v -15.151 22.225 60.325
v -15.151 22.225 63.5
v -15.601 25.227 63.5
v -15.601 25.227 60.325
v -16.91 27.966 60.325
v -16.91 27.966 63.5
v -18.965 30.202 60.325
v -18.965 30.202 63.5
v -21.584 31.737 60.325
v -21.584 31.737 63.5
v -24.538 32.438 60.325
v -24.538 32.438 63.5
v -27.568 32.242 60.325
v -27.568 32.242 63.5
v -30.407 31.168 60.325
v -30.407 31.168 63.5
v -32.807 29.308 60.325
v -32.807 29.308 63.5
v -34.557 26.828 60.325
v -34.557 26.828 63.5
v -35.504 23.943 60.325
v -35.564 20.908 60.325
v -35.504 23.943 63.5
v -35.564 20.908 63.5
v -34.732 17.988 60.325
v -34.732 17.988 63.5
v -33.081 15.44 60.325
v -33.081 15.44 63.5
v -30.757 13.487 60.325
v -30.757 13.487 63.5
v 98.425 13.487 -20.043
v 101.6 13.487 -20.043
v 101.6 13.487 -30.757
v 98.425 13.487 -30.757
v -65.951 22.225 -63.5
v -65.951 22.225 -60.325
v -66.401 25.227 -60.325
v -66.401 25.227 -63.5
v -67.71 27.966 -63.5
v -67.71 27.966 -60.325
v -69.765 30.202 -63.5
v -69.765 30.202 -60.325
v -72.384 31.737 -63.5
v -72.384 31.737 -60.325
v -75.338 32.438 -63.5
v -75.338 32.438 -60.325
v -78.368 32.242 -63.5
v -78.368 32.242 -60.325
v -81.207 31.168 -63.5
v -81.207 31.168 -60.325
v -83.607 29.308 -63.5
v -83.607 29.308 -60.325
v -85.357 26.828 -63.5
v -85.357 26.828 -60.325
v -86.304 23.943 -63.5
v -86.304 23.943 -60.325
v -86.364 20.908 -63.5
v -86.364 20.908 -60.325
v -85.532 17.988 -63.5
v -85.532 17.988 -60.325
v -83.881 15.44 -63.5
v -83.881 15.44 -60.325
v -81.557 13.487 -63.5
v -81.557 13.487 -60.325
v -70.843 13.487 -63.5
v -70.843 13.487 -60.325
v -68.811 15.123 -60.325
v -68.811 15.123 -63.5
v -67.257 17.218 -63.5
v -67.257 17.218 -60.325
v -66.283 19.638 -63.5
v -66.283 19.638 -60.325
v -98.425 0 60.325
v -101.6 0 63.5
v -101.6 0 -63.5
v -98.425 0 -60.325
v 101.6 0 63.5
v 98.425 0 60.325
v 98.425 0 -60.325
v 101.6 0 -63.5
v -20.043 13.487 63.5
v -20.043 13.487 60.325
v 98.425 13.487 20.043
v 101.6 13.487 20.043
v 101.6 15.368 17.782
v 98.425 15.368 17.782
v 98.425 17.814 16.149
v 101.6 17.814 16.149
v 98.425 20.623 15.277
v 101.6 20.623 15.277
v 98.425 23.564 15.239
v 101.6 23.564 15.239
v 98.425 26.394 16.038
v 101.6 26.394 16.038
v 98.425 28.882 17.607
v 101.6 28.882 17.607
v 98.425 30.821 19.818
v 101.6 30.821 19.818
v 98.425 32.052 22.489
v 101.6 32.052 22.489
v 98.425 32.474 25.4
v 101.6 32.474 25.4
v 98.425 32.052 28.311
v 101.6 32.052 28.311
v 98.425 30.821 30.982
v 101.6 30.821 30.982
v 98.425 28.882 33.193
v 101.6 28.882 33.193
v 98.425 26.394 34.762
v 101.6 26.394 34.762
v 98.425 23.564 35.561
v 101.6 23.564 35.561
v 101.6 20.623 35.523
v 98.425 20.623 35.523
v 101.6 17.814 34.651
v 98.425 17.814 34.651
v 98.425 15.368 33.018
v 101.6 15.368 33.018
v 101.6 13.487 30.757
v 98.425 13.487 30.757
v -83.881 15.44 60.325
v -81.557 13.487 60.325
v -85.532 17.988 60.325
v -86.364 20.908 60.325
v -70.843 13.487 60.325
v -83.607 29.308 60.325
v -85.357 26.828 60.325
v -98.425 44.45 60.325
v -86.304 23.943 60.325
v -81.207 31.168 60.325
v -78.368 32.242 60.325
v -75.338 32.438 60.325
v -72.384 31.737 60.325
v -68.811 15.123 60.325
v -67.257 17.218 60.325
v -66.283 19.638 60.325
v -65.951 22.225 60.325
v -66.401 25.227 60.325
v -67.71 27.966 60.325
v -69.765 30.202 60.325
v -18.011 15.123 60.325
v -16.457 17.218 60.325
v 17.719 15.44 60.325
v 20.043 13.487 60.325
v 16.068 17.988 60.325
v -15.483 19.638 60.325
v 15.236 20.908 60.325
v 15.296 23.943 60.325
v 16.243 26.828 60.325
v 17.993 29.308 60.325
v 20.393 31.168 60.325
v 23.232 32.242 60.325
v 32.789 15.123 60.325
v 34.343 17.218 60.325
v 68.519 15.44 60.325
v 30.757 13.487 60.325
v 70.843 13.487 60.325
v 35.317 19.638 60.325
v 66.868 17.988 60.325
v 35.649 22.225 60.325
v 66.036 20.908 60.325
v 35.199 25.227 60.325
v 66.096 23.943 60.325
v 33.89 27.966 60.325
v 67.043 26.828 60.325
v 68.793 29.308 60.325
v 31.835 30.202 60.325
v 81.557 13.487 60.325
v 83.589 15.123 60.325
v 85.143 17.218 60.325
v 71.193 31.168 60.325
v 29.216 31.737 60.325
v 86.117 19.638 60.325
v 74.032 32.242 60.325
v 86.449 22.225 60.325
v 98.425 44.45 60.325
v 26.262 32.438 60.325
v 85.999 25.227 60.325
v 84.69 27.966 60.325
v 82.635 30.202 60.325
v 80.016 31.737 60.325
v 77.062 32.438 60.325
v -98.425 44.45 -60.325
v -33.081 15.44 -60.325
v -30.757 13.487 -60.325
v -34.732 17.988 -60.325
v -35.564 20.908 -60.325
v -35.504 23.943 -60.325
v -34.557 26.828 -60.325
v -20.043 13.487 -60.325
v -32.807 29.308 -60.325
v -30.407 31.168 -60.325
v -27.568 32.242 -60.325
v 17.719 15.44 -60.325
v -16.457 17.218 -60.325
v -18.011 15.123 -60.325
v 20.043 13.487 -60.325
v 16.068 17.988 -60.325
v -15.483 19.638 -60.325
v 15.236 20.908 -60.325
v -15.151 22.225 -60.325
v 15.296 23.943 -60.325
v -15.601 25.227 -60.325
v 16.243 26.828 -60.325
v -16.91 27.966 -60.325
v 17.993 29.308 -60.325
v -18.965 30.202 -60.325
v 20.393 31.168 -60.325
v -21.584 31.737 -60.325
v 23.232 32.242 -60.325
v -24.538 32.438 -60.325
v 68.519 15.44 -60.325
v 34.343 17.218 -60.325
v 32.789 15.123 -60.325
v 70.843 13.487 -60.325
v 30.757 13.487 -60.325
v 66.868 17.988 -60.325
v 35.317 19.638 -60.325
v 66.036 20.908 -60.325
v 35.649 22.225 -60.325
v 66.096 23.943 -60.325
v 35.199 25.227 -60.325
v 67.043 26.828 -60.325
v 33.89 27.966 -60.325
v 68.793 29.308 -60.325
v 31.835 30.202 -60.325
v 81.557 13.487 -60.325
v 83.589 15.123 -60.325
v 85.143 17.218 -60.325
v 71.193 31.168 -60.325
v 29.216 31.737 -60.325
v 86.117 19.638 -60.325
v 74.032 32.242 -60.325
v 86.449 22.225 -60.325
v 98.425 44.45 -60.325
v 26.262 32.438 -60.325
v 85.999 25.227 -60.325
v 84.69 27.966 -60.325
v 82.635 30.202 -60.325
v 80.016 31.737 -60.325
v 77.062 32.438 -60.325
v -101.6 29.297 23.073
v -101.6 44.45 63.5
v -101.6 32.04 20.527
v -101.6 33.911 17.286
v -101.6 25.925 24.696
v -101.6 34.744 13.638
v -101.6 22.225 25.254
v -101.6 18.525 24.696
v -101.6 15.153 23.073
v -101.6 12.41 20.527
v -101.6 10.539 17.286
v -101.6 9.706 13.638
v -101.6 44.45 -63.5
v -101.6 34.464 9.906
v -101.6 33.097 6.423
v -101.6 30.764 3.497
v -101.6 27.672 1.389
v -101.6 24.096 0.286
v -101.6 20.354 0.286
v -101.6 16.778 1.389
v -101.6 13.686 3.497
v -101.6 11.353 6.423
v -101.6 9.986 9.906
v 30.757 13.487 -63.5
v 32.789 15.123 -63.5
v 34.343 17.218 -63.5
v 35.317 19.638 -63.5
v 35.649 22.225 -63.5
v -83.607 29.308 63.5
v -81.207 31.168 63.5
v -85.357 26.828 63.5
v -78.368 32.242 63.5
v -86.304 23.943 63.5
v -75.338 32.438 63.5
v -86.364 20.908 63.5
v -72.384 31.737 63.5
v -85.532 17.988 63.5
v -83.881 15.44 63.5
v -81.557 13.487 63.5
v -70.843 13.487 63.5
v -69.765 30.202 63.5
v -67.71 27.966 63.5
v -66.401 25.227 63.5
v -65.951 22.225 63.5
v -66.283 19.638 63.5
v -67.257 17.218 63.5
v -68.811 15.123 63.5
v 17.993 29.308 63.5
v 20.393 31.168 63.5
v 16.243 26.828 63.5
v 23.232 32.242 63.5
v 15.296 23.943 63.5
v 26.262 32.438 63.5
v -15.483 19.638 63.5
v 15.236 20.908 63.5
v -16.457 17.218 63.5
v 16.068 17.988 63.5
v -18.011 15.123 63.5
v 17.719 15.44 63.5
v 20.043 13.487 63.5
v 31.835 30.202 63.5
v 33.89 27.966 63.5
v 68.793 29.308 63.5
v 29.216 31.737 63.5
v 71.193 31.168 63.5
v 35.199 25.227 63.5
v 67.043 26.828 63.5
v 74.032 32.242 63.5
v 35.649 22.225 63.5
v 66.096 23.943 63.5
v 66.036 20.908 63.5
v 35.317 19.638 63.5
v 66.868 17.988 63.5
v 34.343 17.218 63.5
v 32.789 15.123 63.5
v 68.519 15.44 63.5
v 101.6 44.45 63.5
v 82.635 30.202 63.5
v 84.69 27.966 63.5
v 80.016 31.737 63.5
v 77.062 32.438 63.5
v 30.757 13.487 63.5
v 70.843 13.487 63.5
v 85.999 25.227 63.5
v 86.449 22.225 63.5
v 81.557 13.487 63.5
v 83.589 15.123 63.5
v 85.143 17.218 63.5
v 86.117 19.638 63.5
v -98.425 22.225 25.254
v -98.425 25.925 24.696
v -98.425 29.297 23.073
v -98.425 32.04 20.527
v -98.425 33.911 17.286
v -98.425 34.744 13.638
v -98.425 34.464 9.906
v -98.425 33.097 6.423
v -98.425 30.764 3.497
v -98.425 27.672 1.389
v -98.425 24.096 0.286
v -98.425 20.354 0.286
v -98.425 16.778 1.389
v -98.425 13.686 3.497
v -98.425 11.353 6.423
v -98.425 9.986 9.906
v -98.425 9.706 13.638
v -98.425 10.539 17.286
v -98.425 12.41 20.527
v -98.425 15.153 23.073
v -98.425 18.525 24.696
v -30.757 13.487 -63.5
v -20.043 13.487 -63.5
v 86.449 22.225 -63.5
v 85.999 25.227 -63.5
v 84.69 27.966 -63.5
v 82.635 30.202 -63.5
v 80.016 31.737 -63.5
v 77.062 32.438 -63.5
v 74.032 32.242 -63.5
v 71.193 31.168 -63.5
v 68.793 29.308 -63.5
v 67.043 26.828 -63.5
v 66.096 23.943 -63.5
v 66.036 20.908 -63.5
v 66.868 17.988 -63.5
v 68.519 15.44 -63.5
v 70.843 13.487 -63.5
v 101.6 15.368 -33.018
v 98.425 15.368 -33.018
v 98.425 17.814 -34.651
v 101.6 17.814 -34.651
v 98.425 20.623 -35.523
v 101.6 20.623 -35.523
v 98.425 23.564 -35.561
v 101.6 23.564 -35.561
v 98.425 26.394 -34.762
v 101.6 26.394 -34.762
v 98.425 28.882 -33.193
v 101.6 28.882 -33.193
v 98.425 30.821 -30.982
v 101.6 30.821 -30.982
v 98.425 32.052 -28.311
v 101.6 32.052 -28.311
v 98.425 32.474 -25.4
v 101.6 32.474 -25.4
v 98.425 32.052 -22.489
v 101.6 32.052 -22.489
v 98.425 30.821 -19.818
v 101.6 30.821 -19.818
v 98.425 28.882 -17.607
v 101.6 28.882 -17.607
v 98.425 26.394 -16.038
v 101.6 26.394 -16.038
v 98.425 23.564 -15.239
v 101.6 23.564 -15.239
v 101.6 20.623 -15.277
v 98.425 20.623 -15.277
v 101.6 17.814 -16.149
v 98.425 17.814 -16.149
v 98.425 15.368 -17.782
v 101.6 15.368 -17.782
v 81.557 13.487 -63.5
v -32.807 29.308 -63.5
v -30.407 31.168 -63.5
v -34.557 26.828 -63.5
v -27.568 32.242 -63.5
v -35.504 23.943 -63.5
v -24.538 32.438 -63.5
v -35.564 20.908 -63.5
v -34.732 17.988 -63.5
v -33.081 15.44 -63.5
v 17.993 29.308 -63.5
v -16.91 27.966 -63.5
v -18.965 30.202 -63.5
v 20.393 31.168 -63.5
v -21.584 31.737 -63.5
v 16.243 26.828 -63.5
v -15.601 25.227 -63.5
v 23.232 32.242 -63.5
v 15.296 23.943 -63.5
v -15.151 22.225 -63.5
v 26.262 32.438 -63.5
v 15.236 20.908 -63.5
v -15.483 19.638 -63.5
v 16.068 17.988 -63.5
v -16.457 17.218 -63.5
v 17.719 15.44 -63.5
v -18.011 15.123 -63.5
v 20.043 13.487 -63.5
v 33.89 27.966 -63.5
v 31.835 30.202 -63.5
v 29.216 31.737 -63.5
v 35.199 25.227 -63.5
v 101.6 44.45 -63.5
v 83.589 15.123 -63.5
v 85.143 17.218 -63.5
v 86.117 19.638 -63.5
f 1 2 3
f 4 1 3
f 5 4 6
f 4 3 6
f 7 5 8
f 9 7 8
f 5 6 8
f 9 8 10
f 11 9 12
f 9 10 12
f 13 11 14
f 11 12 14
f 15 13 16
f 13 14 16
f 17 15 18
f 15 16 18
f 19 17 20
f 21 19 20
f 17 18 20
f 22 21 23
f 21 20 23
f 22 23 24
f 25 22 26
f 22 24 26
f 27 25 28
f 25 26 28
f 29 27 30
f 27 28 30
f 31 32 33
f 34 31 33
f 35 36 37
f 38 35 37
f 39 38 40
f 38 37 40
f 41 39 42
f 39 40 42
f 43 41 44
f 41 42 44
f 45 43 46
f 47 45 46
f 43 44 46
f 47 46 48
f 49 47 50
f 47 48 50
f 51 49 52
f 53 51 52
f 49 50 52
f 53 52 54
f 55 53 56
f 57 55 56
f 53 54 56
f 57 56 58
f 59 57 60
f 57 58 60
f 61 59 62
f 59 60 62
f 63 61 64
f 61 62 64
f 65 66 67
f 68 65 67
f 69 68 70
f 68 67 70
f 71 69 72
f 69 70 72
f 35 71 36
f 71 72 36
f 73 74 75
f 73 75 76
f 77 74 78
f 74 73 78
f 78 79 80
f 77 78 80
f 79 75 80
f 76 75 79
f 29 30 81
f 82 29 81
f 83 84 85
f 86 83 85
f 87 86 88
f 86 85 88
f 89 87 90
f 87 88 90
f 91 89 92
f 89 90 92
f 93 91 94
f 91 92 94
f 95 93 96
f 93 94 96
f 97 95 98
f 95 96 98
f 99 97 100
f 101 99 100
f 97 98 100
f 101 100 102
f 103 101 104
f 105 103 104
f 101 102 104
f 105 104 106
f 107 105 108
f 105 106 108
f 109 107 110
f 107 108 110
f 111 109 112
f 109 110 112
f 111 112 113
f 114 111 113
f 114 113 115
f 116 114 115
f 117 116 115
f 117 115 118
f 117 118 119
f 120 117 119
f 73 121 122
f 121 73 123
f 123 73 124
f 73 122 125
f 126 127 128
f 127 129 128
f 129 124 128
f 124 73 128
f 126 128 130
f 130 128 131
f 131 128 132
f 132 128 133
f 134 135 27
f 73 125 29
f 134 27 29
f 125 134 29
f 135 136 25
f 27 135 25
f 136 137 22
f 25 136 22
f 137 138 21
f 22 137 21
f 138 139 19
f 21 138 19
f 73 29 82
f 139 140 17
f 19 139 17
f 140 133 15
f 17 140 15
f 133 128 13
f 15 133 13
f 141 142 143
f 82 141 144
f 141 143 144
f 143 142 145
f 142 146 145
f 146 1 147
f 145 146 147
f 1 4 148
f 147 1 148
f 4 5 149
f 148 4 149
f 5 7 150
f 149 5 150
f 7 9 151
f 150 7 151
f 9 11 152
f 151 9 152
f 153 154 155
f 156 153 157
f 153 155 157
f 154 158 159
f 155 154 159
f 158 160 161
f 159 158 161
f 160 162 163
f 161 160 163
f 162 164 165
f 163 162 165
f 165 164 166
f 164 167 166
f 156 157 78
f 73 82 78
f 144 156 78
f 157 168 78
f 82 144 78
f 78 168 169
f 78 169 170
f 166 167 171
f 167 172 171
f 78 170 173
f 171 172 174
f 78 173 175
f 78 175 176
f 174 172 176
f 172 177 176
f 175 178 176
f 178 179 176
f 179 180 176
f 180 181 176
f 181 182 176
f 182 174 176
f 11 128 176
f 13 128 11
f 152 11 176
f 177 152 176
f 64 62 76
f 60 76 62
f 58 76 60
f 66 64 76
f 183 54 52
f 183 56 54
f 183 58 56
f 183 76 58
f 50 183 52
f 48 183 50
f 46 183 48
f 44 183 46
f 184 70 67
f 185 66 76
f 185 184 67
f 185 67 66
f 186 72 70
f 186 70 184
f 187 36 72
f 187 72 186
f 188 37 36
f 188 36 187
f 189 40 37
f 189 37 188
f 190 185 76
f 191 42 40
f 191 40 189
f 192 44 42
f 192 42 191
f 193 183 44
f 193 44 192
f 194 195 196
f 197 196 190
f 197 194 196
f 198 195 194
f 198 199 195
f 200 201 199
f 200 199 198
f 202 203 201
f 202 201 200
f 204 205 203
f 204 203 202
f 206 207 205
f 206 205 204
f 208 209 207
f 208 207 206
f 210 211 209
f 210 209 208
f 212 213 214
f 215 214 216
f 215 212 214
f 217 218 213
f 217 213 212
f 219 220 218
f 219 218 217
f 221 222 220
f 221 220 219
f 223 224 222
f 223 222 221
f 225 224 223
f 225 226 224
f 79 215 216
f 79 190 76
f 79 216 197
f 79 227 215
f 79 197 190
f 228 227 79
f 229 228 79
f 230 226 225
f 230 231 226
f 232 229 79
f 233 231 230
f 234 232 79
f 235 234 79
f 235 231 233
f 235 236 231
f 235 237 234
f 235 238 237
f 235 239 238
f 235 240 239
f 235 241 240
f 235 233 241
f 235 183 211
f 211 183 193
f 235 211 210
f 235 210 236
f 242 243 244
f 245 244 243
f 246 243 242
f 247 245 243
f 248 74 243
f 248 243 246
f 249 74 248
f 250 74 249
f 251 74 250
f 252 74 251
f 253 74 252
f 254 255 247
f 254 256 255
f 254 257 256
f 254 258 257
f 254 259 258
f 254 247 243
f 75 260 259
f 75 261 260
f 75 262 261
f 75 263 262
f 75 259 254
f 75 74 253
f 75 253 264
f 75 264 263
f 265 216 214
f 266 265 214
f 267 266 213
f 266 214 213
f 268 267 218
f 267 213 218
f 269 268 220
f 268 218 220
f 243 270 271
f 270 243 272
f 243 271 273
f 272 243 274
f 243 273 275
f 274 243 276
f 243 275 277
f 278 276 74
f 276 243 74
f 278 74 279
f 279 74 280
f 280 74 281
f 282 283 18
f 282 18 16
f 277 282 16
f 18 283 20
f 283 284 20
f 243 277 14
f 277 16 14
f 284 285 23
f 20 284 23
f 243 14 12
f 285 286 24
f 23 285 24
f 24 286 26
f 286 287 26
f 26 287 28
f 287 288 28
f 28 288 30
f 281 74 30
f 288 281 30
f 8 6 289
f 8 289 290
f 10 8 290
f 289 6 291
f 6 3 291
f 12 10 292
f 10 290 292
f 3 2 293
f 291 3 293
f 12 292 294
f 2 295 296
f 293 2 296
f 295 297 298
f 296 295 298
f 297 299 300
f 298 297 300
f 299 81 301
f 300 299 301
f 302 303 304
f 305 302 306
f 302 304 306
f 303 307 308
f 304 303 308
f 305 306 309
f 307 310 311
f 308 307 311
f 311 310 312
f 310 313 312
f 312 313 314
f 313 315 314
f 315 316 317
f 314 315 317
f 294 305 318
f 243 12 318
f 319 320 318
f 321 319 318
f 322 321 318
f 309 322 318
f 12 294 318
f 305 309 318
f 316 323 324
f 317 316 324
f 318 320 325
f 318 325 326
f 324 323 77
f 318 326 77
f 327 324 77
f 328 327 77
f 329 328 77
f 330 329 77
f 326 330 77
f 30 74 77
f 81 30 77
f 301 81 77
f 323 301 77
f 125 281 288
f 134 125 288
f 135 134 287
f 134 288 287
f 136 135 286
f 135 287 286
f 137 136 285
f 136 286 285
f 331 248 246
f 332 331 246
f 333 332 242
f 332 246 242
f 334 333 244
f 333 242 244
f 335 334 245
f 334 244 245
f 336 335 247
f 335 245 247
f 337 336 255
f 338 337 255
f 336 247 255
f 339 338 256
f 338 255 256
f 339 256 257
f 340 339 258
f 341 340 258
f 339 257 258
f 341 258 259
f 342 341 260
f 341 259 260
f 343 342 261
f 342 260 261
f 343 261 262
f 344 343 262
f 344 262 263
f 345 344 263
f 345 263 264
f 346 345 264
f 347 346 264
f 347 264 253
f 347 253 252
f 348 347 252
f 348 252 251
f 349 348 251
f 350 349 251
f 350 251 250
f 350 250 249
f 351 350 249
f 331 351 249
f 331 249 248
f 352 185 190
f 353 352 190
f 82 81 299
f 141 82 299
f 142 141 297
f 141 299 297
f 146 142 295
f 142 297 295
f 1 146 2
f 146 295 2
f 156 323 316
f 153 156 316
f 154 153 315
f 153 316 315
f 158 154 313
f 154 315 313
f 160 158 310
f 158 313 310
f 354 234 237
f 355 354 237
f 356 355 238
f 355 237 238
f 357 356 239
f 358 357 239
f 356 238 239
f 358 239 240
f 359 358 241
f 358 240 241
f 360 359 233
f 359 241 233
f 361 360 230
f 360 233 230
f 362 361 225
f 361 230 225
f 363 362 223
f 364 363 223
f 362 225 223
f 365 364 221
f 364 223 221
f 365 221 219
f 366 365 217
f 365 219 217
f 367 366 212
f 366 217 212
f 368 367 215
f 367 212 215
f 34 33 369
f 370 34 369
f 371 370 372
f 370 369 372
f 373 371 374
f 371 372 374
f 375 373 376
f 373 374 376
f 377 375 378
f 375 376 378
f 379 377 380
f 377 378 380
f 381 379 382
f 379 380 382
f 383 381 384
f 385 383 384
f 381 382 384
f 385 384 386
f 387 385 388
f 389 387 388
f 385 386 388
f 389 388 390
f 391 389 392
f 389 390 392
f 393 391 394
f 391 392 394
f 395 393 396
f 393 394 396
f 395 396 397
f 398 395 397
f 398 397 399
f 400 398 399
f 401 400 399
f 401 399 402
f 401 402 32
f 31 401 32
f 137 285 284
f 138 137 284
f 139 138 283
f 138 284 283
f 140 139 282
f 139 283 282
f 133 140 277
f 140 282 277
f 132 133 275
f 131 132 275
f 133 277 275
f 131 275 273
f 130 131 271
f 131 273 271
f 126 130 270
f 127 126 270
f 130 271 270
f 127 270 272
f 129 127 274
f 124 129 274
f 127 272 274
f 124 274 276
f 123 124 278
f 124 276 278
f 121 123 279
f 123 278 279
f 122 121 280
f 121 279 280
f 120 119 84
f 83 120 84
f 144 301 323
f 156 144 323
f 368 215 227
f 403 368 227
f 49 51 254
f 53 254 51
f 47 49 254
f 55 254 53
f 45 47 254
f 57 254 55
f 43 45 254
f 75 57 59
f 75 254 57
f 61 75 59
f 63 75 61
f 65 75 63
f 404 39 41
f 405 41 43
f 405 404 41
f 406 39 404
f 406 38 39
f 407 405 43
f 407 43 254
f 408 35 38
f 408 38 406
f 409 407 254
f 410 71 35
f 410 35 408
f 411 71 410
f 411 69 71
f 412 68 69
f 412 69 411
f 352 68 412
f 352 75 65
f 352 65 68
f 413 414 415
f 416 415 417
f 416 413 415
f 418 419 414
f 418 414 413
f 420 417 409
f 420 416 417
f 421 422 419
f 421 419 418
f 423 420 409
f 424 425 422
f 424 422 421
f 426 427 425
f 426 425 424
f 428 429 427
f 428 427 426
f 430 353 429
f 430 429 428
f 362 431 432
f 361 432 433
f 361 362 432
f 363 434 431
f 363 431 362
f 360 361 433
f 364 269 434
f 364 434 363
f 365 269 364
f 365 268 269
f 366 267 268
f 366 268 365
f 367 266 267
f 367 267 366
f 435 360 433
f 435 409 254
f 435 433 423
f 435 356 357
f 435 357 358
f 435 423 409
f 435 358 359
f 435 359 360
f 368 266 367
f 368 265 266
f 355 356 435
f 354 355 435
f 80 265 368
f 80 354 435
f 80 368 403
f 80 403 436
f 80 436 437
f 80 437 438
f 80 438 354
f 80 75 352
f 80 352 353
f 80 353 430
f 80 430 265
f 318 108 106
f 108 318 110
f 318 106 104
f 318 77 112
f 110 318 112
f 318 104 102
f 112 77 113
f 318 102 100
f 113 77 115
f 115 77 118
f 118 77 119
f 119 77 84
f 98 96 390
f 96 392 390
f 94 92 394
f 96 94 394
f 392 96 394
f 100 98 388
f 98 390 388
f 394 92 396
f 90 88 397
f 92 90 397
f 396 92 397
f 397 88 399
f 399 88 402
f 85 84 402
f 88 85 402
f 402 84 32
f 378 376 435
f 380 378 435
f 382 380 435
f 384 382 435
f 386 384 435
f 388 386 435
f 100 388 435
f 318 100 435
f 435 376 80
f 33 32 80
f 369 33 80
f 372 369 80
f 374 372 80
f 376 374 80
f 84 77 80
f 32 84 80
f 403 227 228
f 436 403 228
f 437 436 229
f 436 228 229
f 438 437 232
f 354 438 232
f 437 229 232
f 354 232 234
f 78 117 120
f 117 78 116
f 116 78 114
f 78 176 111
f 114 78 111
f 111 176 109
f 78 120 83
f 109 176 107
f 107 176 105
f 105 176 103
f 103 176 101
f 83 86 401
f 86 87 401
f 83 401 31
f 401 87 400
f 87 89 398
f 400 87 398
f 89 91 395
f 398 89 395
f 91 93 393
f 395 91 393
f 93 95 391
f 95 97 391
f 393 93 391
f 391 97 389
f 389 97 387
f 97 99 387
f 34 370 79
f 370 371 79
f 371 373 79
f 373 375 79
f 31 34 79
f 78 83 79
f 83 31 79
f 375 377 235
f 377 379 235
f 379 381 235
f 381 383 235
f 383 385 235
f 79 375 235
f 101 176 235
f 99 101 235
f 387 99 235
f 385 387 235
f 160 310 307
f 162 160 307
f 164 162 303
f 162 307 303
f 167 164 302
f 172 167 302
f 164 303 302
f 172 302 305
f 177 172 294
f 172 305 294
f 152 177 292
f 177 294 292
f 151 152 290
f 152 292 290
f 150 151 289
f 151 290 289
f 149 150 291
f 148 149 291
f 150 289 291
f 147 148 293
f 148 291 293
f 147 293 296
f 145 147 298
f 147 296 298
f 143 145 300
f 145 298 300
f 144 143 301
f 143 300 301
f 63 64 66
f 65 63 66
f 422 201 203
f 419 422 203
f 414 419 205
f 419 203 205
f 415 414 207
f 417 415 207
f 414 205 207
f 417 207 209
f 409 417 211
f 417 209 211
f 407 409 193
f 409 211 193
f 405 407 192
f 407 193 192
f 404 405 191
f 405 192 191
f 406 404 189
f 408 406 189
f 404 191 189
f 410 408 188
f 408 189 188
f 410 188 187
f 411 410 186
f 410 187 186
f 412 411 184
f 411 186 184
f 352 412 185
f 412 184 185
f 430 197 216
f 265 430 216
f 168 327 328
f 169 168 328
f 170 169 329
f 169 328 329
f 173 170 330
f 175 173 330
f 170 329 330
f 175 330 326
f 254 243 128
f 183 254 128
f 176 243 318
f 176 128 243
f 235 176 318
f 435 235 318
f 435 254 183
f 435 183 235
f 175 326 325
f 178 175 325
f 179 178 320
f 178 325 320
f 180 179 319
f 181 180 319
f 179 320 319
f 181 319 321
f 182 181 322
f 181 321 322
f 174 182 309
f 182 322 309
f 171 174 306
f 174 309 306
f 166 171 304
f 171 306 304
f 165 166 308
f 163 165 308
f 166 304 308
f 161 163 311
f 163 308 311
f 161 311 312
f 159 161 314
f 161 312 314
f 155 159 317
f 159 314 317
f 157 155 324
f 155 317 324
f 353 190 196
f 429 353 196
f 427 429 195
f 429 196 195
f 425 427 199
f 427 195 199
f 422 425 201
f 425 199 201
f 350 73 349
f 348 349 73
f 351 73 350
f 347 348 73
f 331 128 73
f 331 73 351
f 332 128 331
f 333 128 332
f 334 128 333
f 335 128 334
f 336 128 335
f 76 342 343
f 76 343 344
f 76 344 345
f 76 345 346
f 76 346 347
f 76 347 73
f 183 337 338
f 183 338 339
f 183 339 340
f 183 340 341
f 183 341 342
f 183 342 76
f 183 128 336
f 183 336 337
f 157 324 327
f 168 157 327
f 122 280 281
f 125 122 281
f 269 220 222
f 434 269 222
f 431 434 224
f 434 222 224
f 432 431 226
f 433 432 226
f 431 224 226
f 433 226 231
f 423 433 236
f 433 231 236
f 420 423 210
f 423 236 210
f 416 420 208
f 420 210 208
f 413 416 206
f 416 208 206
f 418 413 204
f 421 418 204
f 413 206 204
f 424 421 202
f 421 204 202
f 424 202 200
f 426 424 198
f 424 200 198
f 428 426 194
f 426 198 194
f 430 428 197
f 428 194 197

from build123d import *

# Parameters (mm, degrees)
SKETCH1_W           = 203.2
SKETCH1_H           = 127
BOSS_EXTRUDE1_DEPTH = 44.45
SKETCH2_W           = 196.85
SKETCH2_H           = 120.65
CUT_EXTRUDE1_DEPTH  = 45.45
SKETCH4_W           = 203.2
SKETCH4_H           = 127
SKETCH4_W_2         = 196.85
SKETCH4_H_2         = 120.65
BOSS_EXTRUDE2_DEPTH = 6.35
CUT_EXTRUDE5_DEPTH  = 128
CUT_EXTRUDE6_REACH  = 205.2
CUT_EXTRUDE7_REACH  = 205.2
SKETCH13_R          = 12.55395


with BuildPart() as part:
    # Sketch1 → Boss-Extrude1 (new body)
    with BuildSketch(Plane(origin=(0, 0, 0), x_dir=(1, 0, 0), z_dir=(0, 1, 0))):
        Rectangle(SKETCH1_W, SKETCH1_H)
    extrude(amount=BOSS_EXTRUDE1_DEPTH)

    # Sketch2 → Cut-Extrude1 (cut, through all)
    with BuildSketch(Plane(origin=(0, 44.45, 0), x_dir=(1, 0, 0), z_dir=(0, 1, 0))):
        Rectangle(SKETCH2_W, SKETCH2_H)
    extrude(amount=-CUT_EXTRUDE1_DEPTH, mode=Mode.SUBTRACT)

    # Sketch4 → Boss-Extrude2 (add)
    with BuildSketch(Plane(origin=(0, 44.45, 0), x_dir=(1, 0, 0), z_dir=(0, 1, 0))):
        Rectangle(SKETCH4_W, SKETCH4_H)
        Rectangle(SKETCH4_W_2, SKETCH4_H_2, mode=Mode.SUBTRACT)
    extrude(amount=-BOSS_EXTRUDE2_DEPTH)

    # Sketch10 → Cut-Extrude5 (cut, through all)
    with BuildSketch(Plane.XY.offset(63.5)):
        with BuildLine():
            ThreePointArc((-65.9511, 22.225), (-81.206975571, 31.167602912), (-81.556705839, 13.4874))
            Line((-81.556705839, 13.4874), (-70.843294161, 13.4874))
            ThreePointArc((-70.843294161, 13.4874), (-67.257397088, 17.218024429), (-65.9511, 22.225))
        make_face()
        with BuildLine():
            ThreePointArc((-15.1511, 22.225), (-30.406975571, 31.167602912), (-30.756705839, 13.4874))
            Line((-30.756705839, 13.4874), (-20.043294161, 13.4874))
            ThreePointArc((-20.043294161, 13.4874), (-16.457397088, 17.218024429), (-15.1511, 22.225))
        make_face()
        with BuildLine():
            ThreePointArc((35.6489, 22.225), (20.393024429, 31.167602912), (20.043294161, 13.4874))
            Line((20.043294161, 13.4874), (30.756705839, 13.4874))
            ThreePointArc((30.756705839, 13.4874), (34.342602912, 17.218024429), (35.6489, 22.225))
        make_face()
        with BuildLine():
            Line((70.843294161, 13.4874), (81.556705839, 13.4874))
            ThreePointArc((81.556705839, 13.4874), (85.142602912, 17.218024429), (86.4489, 22.225))
            ThreePointArc((86.4489, 22.225), (71.193024429, 31.167602912), (70.843294161, 13.4874))
        make_face()
    extrude(amount=-CUT_EXTRUDE5_DEPTH, mode=Mode.SUBTRACT)

    # Sketch12 → Cut-Extrude6 (cut, up to next)
    with BuildSketch(Plane(origin=(101.6, 0, 0), x_dir=(0, 0, -1), z_dir=(1, 0, 0)), mode=Mode.PRIVATE) as cut_extrude6_sk1:
        with BuildLine():
            ThreePointArc((-20.043294161, 13.4874), (-25.4, 32.4739), (-30.756705839, 13.4874))
            Line((-30.756705839, 13.4874), (-20.043294161, 13.4874))
        make_face()
    cut_extrude6_tool1 = extrude(cut_extrude6_sk1.sketch, amount=-CUT_EXTRUDE6_REACH, mode=Mode.PRIVATE) & part.part
    add(cut_extrude6_tool1.solids().sort_by_distance((101.6, 22.546198, 25.4))[0], mode=Mode.SUBTRACT)
    # Sketch12 → Cut-Extrude6 (cut, up to next)
    with BuildSketch(Plane(origin=(101.6, 0, 0), x_dir=(0, 0, -1), z_dir=(1, 0, 0)), mode=Mode.PRIVATE) as cut_extrude6_sk2:
        with BuildLine():
            ThreePointArc((30.756705839, 13.4874), (25.4, 32.4739), (20.043294161, 13.4874))
            Line((20.043294161, 13.4874), (30.756705839, 13.4874))
        make_face()
    cut_extrude6_tool2 = extrude(cut_extrude6_sk2.sketch, amount=-CUT_EXTRUDE6_REACH, mode=Mode.PRIVATE) & part.part
    add(cut_extrude6_tool2.solids().sort_by_distance((101.6, 22.546198, -25.4))[0], mode=Mode.SUBTRACT)

    # Sketch13 → Cut-Extrude7 (cut, up to next)
    with BuildSketch(Plane.ZY.offset(101.6), mode=Mode.PRIVATE) as cut_extrude7_sk1:
        with Locations((12.7, 22.225)):
            Circle(SKETCH13_R)
    cut_extrude7_tool1 = extrude(cut_extrude7_sk1.sketch, amount=-CUT_EXTRUDE7_REACH, mode=Mode.PRIVATE) & part.part
    add(cut_extrude7_tool1.solids().sort_by_distance((-101.6, 22.225, 12.7))[0], mode=Mode.SUBTRACT)


solid = part.part
